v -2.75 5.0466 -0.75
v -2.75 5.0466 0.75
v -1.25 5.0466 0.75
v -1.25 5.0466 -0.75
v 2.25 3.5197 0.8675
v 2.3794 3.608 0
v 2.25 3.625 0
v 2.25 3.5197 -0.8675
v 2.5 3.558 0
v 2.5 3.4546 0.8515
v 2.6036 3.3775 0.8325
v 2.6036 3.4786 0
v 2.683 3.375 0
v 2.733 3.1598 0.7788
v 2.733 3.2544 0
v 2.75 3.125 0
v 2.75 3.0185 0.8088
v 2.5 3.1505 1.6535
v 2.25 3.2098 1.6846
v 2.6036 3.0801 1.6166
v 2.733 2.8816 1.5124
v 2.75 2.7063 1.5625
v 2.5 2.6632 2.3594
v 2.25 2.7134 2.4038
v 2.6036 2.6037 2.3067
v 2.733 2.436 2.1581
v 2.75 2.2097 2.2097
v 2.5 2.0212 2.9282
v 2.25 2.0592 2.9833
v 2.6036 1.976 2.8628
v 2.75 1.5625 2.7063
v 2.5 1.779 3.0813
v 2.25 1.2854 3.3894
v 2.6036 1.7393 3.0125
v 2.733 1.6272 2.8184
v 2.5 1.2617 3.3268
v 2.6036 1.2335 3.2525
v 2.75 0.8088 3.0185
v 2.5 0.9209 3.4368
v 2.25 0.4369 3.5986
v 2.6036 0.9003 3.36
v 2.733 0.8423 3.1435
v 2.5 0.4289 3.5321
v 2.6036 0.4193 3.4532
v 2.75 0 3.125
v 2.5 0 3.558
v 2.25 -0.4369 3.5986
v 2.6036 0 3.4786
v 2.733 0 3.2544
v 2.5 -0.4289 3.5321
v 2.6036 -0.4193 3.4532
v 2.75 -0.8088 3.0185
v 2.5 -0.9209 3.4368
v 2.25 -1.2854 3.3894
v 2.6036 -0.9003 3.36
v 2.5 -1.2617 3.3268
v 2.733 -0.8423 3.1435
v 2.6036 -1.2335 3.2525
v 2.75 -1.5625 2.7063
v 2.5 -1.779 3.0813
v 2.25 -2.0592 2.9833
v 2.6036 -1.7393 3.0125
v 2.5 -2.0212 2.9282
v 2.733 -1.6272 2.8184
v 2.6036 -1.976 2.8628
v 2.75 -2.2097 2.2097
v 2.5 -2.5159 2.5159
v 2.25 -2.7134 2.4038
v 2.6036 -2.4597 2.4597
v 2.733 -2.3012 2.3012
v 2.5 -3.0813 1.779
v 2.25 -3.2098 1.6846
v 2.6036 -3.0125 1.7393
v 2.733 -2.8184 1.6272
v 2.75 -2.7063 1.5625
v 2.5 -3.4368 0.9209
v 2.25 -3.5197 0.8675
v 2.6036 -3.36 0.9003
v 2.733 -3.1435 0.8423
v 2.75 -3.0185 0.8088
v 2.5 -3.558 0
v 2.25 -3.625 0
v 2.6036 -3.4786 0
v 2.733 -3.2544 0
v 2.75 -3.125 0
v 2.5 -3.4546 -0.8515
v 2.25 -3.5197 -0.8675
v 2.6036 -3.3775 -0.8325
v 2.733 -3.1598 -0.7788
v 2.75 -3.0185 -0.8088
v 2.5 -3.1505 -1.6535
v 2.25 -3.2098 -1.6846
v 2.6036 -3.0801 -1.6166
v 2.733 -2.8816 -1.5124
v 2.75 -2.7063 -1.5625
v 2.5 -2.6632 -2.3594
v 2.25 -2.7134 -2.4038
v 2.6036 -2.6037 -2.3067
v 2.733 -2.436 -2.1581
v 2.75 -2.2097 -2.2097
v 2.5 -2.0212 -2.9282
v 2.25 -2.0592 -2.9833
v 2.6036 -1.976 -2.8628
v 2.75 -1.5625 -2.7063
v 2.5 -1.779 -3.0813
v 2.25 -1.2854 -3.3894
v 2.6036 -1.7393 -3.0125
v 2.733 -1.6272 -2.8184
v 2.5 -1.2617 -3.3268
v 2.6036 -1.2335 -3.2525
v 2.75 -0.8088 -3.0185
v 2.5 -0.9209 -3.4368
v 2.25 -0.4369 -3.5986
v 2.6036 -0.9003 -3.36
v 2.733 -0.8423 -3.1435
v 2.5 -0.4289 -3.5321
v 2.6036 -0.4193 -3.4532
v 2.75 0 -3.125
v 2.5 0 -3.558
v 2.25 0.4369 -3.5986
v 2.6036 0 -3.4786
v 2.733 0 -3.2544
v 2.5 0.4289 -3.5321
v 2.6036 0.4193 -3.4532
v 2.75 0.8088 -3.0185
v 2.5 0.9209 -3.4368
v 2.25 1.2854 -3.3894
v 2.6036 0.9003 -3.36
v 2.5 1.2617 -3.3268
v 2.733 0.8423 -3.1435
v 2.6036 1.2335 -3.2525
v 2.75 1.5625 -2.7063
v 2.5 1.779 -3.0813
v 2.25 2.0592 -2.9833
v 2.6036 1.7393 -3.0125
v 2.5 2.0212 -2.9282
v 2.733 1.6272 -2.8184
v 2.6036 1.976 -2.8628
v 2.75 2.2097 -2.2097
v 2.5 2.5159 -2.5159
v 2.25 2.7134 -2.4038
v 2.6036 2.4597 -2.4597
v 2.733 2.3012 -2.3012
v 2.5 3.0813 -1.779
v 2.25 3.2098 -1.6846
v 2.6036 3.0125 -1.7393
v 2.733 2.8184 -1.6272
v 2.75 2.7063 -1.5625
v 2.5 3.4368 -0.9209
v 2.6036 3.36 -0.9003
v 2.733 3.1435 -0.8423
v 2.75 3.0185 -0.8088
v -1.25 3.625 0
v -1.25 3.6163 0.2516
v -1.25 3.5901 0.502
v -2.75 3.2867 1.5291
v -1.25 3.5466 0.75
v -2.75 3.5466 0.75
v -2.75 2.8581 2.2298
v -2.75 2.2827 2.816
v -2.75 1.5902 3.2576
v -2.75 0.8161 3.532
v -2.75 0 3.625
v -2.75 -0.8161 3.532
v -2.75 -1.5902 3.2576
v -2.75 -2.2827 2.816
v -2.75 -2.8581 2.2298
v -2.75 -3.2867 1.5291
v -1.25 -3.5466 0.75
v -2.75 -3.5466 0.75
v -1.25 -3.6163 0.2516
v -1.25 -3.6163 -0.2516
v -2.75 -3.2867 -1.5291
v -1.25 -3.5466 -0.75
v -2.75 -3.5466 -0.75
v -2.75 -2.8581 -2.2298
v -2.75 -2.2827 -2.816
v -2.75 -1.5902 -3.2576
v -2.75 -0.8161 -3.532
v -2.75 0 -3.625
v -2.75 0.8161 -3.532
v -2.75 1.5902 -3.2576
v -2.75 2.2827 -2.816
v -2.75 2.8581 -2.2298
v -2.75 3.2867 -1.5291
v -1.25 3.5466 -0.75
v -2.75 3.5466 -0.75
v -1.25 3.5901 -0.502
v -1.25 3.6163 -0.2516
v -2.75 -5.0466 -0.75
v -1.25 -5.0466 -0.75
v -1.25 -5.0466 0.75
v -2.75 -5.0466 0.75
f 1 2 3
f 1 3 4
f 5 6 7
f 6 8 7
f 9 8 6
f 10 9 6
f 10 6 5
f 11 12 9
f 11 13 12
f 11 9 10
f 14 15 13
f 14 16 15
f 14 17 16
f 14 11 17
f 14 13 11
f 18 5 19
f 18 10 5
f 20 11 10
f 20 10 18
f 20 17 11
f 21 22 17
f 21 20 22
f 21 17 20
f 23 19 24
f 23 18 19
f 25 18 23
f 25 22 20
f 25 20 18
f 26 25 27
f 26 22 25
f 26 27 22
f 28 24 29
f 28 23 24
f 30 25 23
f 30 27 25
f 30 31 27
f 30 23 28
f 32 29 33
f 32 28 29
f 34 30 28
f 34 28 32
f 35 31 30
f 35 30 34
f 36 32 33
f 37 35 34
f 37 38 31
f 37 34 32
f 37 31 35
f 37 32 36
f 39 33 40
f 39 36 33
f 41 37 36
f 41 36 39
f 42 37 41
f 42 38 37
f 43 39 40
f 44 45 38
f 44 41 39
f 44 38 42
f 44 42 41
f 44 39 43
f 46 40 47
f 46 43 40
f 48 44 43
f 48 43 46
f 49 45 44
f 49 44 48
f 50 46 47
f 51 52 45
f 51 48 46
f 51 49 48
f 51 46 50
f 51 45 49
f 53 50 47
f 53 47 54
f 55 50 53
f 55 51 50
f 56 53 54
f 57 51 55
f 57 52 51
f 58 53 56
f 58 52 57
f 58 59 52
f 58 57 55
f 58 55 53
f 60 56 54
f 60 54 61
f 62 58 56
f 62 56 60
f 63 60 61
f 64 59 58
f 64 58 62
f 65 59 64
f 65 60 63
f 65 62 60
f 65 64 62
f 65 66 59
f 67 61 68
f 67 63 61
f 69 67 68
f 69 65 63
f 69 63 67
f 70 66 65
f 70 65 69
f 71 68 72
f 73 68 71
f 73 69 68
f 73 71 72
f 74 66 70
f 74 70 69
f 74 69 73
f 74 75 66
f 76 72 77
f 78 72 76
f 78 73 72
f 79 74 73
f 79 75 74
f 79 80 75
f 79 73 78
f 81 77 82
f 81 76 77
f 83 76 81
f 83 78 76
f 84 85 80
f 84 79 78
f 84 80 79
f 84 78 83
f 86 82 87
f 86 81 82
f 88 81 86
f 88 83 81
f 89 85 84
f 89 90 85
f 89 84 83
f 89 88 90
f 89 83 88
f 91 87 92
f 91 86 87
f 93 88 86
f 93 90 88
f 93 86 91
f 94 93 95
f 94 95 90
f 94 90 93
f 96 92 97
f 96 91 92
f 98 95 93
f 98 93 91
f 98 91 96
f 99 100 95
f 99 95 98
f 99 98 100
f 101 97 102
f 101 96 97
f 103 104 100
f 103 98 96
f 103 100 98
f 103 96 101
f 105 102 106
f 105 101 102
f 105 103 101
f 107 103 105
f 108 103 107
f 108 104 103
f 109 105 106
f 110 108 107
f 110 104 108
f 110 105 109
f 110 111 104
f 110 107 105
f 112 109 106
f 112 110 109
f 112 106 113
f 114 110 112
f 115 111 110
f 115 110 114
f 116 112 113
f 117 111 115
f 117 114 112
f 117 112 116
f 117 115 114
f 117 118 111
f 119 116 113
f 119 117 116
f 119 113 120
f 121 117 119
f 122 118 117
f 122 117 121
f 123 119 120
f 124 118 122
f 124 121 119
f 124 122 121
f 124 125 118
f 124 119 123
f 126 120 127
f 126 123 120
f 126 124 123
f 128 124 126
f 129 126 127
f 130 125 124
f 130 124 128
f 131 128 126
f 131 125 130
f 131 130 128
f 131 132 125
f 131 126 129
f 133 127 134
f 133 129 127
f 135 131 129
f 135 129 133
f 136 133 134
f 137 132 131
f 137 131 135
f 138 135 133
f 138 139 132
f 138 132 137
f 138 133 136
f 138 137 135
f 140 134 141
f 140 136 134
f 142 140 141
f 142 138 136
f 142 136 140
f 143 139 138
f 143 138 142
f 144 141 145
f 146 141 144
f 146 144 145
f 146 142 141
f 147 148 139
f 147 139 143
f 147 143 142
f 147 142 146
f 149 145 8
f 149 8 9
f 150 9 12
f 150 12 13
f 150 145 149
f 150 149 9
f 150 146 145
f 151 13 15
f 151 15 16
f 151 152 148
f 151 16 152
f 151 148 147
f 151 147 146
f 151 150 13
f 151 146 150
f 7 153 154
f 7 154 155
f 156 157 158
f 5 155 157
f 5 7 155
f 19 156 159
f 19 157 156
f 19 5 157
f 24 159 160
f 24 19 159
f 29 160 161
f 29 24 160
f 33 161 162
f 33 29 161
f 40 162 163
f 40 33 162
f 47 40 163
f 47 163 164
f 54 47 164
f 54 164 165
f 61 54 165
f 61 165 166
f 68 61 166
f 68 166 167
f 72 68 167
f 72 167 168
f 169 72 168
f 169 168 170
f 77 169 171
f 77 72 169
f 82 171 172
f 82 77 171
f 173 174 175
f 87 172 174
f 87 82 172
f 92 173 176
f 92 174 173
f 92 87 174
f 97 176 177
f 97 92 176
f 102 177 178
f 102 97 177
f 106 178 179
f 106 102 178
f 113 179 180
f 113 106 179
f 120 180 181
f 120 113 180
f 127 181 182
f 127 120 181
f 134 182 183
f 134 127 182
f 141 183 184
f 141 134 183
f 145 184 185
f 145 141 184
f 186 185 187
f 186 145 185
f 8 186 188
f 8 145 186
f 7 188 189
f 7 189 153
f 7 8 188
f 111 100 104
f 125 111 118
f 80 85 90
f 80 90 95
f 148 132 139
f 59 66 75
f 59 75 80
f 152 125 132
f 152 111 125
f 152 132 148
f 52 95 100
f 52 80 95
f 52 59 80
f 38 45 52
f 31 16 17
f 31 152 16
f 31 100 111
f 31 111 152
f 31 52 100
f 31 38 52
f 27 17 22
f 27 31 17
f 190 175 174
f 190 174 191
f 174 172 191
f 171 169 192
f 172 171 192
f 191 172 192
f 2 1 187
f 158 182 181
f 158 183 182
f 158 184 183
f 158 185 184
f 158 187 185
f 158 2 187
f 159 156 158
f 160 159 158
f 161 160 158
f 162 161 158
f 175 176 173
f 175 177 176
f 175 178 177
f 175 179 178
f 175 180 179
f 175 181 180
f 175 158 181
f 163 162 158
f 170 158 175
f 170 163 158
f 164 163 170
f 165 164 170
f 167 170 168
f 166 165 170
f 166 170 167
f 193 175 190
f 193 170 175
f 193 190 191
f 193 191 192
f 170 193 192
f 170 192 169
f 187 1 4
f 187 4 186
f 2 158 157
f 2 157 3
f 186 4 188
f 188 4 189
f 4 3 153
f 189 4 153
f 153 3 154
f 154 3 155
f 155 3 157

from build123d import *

# Parameters (mm, degrees)
F0_R     = 3.625
F1_DEPTH = 2.75
F2_R     = 0.5
F4_DEPTH = 1.5


with BuildPart() as f1:
    # F0 (on Right) → F1 (new body, symmetric)
    with BuildSketch(Plane.YZ):
        Circle(F0_R)
    extrude(amount=F1_DEPTH, both=True)

    # F2
    f2_edges = [f1.edges().sort_by_distance(p)[0] for p in [
        (2.75, -3.625, 0),
    ]]
    fillet(f2_edges, radius=F2_R)

    # F3 (on face) → F4 (join)
    with BuildSketch(Plane(origin=(-2.75, 0, 0), x_dir=(0, -1, 0), z_dir=(-1, 0, 0))):
        with BuildLine():
            Line((3.546565, -0.75), (5.046565, -0.75))
            Line((5.046565, -0.75), (5.046565, 0.75))
            Line((5.046565, 0.75), (3.546565, 0.75))
            ThreePointArc((3.546565, 0.75), (3.625, 0), (3.546565, -0.75))
        make_face()
        with BuildLine():
            Line((-3.546565, 0.75), (-5.046565, 0.75))
            Line((-5.046565, 0.75), (-5.046565, -0.75))
            Line((-5.046565, -0.75), (-3.546565, -0.75))
            ThreePointArc((-3.546565, -0.75), (-3.625, 0), (-3.546565, 0.75))
        make_face()
    extrude(amount=-F4_DEPTH)


solid = f1.part
